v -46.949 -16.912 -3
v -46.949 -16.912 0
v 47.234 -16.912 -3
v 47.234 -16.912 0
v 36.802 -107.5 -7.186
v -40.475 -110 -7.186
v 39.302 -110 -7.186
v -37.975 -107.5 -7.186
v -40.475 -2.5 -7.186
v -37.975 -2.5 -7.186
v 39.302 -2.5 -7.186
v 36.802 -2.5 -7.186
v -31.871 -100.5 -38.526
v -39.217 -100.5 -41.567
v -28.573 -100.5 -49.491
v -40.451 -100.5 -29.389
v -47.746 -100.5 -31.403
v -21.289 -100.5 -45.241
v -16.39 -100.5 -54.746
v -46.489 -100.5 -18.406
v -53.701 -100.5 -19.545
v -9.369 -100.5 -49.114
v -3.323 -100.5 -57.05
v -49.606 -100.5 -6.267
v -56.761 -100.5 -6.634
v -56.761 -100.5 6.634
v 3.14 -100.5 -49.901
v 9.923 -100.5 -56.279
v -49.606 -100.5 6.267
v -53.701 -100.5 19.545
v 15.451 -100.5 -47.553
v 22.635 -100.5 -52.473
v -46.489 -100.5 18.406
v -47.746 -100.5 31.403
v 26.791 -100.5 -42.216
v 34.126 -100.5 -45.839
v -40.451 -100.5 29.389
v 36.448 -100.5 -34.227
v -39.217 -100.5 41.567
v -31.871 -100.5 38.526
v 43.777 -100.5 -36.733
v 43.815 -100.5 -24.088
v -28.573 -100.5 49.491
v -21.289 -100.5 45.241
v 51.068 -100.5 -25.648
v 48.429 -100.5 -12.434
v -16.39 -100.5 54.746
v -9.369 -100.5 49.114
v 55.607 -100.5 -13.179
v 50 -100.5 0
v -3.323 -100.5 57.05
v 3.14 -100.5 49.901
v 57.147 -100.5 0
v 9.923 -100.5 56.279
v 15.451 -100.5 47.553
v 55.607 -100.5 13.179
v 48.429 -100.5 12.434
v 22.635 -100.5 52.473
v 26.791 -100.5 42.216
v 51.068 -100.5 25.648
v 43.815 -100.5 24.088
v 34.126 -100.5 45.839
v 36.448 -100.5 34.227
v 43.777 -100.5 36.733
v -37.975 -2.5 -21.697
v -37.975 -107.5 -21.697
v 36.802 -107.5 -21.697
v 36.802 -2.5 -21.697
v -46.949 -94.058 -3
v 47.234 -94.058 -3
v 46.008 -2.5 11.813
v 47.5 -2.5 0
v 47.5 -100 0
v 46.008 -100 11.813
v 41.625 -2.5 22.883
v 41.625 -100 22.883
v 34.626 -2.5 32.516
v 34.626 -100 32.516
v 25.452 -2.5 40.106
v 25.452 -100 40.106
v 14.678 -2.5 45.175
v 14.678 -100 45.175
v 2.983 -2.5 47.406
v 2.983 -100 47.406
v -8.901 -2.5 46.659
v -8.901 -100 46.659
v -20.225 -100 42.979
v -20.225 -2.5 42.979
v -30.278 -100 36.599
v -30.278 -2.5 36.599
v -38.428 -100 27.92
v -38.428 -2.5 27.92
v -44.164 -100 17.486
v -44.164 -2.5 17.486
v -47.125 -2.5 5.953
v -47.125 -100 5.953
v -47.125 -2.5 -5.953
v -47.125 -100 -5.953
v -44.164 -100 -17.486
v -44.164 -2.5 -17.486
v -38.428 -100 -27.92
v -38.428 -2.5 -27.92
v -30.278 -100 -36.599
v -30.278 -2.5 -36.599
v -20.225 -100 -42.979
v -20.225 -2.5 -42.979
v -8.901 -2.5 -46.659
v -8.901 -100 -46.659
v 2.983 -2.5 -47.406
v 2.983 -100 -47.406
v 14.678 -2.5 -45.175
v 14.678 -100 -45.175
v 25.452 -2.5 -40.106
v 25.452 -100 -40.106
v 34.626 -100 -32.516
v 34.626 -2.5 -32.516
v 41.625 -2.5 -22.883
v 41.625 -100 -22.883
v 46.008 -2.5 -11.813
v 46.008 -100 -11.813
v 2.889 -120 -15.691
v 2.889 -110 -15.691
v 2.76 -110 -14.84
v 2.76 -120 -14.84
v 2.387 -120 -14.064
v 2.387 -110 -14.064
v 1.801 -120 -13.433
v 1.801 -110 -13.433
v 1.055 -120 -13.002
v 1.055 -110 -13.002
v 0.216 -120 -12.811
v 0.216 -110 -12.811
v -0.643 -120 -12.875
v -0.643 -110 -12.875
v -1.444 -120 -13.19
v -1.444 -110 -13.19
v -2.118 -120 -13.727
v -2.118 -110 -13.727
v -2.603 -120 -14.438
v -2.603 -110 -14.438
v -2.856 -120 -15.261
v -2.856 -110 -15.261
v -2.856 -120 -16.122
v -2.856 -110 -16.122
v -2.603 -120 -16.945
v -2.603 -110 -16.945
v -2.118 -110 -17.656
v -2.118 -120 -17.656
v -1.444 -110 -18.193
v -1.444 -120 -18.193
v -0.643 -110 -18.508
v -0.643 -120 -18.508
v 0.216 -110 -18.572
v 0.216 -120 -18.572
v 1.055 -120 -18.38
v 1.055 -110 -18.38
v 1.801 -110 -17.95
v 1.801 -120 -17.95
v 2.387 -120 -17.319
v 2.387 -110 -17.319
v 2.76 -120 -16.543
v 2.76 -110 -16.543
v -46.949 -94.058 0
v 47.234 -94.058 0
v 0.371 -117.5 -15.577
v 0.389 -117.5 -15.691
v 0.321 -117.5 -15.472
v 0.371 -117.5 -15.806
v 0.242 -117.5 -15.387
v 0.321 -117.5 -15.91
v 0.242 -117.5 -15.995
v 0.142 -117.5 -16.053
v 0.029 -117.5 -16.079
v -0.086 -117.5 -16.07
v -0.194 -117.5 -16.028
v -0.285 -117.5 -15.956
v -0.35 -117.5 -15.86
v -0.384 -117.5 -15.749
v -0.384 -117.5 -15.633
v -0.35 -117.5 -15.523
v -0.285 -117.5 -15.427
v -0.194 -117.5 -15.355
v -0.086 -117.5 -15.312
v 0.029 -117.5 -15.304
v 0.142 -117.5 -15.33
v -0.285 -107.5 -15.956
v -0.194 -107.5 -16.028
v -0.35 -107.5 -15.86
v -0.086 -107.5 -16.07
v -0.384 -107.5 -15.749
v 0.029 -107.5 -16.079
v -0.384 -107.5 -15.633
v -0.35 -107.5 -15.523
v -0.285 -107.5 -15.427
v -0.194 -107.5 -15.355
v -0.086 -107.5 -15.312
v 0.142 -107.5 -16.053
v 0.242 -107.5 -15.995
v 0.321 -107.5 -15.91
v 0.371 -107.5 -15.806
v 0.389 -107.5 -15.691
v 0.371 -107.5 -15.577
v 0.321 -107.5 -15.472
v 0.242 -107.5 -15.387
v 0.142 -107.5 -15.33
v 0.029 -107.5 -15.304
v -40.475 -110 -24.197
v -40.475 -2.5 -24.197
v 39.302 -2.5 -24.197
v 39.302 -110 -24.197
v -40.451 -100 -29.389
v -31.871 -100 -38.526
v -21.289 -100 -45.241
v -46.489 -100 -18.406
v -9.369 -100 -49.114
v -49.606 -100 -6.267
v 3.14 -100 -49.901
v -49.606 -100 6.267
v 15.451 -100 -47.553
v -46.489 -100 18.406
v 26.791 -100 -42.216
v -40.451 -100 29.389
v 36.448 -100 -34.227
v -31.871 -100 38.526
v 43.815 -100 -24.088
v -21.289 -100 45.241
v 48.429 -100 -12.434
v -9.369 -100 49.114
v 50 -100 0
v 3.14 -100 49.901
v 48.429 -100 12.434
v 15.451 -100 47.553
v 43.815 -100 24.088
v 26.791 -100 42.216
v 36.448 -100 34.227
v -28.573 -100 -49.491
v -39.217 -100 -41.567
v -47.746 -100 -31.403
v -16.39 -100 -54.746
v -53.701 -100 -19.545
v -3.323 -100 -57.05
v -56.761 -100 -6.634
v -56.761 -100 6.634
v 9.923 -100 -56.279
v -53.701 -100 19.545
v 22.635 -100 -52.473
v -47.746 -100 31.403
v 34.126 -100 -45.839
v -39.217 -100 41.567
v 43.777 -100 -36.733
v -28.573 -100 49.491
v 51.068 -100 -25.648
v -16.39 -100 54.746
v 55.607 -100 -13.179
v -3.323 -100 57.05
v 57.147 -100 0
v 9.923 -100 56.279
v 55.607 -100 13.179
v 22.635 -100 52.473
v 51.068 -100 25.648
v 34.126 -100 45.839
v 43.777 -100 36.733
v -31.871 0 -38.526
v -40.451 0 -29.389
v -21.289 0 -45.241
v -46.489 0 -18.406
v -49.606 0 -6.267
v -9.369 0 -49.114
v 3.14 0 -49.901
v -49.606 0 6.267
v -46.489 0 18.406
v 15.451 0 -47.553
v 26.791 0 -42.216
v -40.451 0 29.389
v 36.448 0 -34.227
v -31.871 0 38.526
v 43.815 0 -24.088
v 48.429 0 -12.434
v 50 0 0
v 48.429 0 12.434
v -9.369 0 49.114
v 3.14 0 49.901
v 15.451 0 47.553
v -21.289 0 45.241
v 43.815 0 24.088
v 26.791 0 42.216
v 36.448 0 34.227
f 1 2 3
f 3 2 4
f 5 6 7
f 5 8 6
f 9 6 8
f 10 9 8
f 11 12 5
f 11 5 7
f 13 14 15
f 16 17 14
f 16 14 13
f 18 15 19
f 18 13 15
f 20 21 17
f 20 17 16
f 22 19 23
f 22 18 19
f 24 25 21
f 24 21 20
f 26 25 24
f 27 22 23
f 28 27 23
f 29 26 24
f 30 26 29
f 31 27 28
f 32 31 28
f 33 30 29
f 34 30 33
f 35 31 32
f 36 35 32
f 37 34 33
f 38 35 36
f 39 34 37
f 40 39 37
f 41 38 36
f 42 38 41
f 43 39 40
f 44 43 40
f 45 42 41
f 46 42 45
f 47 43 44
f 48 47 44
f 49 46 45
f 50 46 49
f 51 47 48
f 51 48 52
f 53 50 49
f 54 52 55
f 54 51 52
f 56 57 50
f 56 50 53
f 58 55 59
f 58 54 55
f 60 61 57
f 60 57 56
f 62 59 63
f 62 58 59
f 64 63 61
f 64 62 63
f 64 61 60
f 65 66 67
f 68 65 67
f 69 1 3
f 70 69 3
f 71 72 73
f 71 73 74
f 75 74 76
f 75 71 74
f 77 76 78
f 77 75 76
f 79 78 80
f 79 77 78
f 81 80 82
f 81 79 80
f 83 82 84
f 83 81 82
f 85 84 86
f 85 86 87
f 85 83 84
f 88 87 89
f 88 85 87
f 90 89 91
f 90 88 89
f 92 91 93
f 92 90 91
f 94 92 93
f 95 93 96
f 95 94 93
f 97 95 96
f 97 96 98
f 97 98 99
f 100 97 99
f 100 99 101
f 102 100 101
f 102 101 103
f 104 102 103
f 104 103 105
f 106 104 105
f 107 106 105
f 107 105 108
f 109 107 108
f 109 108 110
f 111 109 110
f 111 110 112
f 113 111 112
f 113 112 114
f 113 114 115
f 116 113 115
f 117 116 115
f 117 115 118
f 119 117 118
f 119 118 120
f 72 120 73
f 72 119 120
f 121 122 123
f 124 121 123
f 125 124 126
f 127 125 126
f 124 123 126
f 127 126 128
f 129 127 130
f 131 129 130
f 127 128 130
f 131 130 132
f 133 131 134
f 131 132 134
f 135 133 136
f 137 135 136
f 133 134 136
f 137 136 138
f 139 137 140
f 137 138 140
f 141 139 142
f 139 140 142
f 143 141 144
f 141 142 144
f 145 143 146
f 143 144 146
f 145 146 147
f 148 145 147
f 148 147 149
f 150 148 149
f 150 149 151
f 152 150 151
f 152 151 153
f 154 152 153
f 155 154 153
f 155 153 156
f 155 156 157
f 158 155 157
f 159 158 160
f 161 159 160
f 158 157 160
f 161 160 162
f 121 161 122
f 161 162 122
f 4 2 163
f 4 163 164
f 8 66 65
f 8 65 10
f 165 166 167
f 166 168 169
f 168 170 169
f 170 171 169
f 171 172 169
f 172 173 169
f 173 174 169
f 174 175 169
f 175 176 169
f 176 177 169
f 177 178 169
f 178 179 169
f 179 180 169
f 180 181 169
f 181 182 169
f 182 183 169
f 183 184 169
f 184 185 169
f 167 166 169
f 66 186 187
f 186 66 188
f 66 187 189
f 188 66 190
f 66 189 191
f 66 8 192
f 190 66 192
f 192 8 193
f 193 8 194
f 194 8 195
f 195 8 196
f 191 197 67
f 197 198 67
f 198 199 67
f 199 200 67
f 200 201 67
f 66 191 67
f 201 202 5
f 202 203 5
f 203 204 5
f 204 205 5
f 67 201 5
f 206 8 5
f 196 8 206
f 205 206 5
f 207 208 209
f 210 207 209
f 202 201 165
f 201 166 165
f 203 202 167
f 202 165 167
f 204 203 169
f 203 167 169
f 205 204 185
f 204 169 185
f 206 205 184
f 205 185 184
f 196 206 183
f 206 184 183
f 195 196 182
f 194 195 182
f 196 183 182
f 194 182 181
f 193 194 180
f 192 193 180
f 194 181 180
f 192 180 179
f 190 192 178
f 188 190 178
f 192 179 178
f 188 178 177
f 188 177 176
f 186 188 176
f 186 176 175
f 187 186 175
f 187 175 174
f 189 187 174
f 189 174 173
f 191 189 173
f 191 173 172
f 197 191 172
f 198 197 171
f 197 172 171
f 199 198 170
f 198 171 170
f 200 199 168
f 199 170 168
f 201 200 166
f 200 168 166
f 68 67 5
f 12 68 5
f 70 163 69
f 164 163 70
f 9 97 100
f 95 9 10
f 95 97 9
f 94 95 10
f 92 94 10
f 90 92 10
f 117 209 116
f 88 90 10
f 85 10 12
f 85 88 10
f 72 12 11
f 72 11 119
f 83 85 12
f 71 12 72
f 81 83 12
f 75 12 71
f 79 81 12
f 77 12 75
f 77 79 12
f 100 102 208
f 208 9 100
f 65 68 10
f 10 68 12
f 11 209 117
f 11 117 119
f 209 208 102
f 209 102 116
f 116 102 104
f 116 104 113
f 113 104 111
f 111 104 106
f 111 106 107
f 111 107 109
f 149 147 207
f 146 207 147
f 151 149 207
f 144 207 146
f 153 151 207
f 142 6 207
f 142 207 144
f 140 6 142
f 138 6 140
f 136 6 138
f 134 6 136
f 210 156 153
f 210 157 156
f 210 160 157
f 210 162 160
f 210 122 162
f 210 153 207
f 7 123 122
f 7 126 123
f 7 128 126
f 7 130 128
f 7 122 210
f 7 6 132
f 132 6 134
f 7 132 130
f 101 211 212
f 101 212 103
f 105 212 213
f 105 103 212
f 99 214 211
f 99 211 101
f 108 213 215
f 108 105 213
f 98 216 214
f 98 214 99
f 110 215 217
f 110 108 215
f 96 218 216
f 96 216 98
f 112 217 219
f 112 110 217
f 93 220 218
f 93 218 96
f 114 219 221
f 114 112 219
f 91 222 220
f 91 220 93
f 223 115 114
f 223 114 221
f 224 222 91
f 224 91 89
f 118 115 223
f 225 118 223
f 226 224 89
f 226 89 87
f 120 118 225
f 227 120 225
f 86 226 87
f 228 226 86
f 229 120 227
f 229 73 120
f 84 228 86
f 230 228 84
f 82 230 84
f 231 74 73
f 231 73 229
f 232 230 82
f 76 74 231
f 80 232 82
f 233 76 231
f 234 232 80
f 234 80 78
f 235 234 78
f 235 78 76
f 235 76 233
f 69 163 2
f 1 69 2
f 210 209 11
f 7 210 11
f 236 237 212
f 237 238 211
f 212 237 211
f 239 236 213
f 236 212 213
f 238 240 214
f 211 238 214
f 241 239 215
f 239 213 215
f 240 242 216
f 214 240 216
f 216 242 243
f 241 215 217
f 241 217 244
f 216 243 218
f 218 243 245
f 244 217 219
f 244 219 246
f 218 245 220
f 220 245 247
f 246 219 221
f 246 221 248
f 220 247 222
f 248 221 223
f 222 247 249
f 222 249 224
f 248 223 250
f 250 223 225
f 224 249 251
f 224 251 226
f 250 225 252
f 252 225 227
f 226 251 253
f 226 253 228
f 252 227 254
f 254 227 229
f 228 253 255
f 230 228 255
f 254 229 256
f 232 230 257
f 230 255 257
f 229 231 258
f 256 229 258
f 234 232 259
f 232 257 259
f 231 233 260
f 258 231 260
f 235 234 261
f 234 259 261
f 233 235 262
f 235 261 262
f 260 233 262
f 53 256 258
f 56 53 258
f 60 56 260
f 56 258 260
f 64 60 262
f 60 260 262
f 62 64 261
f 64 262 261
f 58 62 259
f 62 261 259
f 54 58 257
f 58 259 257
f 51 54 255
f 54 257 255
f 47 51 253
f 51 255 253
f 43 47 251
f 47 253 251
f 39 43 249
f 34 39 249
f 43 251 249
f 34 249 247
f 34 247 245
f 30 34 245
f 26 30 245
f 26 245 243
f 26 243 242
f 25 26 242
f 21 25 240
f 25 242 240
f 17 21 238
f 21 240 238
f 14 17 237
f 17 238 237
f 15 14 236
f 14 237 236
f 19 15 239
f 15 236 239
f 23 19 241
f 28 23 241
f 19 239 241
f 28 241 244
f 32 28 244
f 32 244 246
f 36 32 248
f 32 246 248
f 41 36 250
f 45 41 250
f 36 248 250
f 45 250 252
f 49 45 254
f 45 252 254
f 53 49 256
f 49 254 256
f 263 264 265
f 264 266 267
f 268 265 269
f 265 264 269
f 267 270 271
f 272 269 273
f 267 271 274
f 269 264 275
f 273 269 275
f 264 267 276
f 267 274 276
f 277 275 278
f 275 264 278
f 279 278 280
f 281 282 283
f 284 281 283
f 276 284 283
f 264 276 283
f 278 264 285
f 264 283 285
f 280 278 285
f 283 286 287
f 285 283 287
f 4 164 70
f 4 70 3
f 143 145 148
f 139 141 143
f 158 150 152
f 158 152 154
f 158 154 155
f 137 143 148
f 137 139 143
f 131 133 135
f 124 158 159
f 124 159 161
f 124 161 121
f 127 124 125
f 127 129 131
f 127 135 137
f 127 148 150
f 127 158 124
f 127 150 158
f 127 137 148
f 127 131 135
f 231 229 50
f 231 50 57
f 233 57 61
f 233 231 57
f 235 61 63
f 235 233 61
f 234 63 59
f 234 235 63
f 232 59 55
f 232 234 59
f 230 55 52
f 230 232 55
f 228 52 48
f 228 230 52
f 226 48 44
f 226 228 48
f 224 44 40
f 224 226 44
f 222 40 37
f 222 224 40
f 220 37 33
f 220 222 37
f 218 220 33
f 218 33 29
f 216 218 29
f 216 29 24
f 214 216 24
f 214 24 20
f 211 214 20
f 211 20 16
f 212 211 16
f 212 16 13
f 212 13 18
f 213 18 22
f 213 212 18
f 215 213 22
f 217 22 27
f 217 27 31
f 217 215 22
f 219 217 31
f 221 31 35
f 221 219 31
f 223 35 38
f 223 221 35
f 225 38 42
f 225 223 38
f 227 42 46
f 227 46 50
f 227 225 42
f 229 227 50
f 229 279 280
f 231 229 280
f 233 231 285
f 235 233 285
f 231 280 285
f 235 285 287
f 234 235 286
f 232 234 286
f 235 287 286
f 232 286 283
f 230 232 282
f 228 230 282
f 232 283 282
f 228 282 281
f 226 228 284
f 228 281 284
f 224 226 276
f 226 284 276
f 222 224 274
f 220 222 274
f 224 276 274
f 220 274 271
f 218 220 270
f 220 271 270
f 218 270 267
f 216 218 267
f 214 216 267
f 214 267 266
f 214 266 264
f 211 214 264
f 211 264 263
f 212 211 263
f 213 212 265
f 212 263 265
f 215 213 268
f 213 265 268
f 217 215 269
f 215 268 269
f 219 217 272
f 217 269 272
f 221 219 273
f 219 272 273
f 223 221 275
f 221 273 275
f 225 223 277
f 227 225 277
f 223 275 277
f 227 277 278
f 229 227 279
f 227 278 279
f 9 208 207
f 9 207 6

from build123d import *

# Parameters (mm, degrees)
F0_R         = 50
F1_DEPTH     = 100
F2_T         = -2.5
F3_W         = 94.1821336746
F3_H         = 77.1465990692
F4_DEPTH     = 3
F7_W         = 79.7765403986
F7_H         = 17.0111740008
F8_DEPTH     = 110
F9_R         = 2.8886289283
F10_DEPTH    = 10
F12_T        = 2.5
F12_T3_DEPTH = 22.0111740008
F12_T5_DEPTH = 84.7765403986
F13_R        = 57.146981612
F13_R_2      = 50
F14_DEPTH    = 0.5


# Not quite as in the source:
# - a shell that OpenCascade refuses in one call is made with other operations: the cavity is built on its own and cut out
# - a feature names something its author has since deleted; it is built from what else it names
# - the program builds the solid bodies; features that only make, move or delete a surface that nothing else refers to are left out


with BuildPart() as f1:
    # F0 (on Front) → F1 (new body)
    with BuildSketch(Plane.XZ):
        Circle(F0_R)
    extrude(amount=F1_DEPTH)

    # F2
    f2_openings = [f1.faces().sort_by_distance(p)[0] for p in [
        (0, -100, 0),
    ]]
    offset(amount=F2_T, openings=f2_openings)

    # F7 (on Front) → F8 (join)
    with BuildSketch(Plane.XZ):
        with Locations((-0.586591661, -15.6913413666)):
            Rectangle(F7_W, F7_H)
    extrude(amount=F8_DEPTH)

    # F9 (on face) → F10 (join)
    with BuildSketch(Plane.XZ.offset(110)):
        with Locations((0, -15.6913418323)):
            Circle(F9_R)
    extrude(amount=F10_DEPTH)

    # F12: shell of thickness 2.5, made by hand


with BuildPart() as f4:
    # F3 (on Top) → F4 (new body)
    with BuildSketch(Plane.XY):
        with Locations((0.1425482333, -55.4851768538)):
            Rectangle(F3_W, F3_H)
    extrude(amount=-F4_DEPTH)


with BuildPart() as f12_core1:
    # F12_t2: copy of F1
    add(f1.part)

    # the walls: a layer under each face that stays
    f12_faces = [f12_core1.faces().sort_by_distance(p)[0] for p in [
        (-50, -50, 0),
        (0, 0, 0),
        (-46.6666666667, -100, -13.3333333333),
        (-47.5, -51.25, 0),
        (0, -2.5, 0),
        (-40.4748618603, -56.25, -15.6913413666),
        (-0.586591661, -56.25, -24.196928367),
        (39.3016785383, -56.25, -15.6913413666),
        (-27.1787717938, -110, -21.3617327002),
        (-2.8886289283, -115, -15.6913418323),
        (0, -120, -15.6913418323),
    ]]
    thicken(f12_faces, amount=-F12_T, mode=Mode.SUBTRACT)

    # F12_s4 → F12_t3 (cut)
    with BuildSketch(Plane.XY.offset(-26.696928367)):
        Polygon((-40.4998618603, -2.525), (-40.4748618603, 0), (-37.9748618603, 0), (-37.9748618603, -2.5), align=None)
        Polygon((39.3266785383, -2.525), (39.3016785383, 0), (36.8016785383, 0), (36.8016785383, -2.5), align=None)
    extrude(amount=F12_T3_DEPTH, mode=Mode.SUBTRACT)

    # F12_s6 → F12_t5 (cut)
    with BuildSketch(Plane.YZ.offset(-42.9748618603)):
        Polygon((-2.525, -24.221928367), (0, -24.196928367), (0, -21.696928367), (-2.5, -21.696928367), align=None)
    extrude(amount=F12_T5_DEPTH, mode=Mode.SUBTRACT)

    # F12_s7 → F12_t8 (revolve, cut)
    with BuildSketch(Plane.XY):
        Polygon((47.475, -2.525), (50, -2.5), (50, 0), (47.5, 0), align=None)
    revolve(axis=Axis((0, -2.5, 0), (0, 1, 0)), mode=Mode.SUBTRACT)

    # F12_s9 → F12_t10 (revolve, cut)
    with BuildSketch(Plane.XY.offset(-15.6913418323)):
        Polygon((2.9136289283, -110.025), (2.8886289283, -107.5), (0.3886289283, -107.5), (0.3886289283, -110), align=None)
    revolve(axis=Axis((0, -110, -15.6913418323), (0, -1, 0)), mode=Mode.SUBTRACT)


with BuildPart() as f1_1:
    add(f1.part)

    # what is left inside the walls is the cavity
    f12_cavity = [f12_core1.part.solids().sort_by_distance(p)[0] for p in [
        (-0.586592, -72.5, -7.210754),
    ]]
    add(f12_cavity, mode=Mode.SUBTRACT)


with BuildPart() as f14:
    # F13 (on face) → F14 (new body)
    with BuildSketch(Plane.XZ.offset(100)):
        Circle(F13_R)
        Circle(F13_R_2, mode=Mode.SUBTRACT)
    extrude(amount=F14_DEPTH)


solid = Compound([f4.part, f1_1.part, f14.part])
